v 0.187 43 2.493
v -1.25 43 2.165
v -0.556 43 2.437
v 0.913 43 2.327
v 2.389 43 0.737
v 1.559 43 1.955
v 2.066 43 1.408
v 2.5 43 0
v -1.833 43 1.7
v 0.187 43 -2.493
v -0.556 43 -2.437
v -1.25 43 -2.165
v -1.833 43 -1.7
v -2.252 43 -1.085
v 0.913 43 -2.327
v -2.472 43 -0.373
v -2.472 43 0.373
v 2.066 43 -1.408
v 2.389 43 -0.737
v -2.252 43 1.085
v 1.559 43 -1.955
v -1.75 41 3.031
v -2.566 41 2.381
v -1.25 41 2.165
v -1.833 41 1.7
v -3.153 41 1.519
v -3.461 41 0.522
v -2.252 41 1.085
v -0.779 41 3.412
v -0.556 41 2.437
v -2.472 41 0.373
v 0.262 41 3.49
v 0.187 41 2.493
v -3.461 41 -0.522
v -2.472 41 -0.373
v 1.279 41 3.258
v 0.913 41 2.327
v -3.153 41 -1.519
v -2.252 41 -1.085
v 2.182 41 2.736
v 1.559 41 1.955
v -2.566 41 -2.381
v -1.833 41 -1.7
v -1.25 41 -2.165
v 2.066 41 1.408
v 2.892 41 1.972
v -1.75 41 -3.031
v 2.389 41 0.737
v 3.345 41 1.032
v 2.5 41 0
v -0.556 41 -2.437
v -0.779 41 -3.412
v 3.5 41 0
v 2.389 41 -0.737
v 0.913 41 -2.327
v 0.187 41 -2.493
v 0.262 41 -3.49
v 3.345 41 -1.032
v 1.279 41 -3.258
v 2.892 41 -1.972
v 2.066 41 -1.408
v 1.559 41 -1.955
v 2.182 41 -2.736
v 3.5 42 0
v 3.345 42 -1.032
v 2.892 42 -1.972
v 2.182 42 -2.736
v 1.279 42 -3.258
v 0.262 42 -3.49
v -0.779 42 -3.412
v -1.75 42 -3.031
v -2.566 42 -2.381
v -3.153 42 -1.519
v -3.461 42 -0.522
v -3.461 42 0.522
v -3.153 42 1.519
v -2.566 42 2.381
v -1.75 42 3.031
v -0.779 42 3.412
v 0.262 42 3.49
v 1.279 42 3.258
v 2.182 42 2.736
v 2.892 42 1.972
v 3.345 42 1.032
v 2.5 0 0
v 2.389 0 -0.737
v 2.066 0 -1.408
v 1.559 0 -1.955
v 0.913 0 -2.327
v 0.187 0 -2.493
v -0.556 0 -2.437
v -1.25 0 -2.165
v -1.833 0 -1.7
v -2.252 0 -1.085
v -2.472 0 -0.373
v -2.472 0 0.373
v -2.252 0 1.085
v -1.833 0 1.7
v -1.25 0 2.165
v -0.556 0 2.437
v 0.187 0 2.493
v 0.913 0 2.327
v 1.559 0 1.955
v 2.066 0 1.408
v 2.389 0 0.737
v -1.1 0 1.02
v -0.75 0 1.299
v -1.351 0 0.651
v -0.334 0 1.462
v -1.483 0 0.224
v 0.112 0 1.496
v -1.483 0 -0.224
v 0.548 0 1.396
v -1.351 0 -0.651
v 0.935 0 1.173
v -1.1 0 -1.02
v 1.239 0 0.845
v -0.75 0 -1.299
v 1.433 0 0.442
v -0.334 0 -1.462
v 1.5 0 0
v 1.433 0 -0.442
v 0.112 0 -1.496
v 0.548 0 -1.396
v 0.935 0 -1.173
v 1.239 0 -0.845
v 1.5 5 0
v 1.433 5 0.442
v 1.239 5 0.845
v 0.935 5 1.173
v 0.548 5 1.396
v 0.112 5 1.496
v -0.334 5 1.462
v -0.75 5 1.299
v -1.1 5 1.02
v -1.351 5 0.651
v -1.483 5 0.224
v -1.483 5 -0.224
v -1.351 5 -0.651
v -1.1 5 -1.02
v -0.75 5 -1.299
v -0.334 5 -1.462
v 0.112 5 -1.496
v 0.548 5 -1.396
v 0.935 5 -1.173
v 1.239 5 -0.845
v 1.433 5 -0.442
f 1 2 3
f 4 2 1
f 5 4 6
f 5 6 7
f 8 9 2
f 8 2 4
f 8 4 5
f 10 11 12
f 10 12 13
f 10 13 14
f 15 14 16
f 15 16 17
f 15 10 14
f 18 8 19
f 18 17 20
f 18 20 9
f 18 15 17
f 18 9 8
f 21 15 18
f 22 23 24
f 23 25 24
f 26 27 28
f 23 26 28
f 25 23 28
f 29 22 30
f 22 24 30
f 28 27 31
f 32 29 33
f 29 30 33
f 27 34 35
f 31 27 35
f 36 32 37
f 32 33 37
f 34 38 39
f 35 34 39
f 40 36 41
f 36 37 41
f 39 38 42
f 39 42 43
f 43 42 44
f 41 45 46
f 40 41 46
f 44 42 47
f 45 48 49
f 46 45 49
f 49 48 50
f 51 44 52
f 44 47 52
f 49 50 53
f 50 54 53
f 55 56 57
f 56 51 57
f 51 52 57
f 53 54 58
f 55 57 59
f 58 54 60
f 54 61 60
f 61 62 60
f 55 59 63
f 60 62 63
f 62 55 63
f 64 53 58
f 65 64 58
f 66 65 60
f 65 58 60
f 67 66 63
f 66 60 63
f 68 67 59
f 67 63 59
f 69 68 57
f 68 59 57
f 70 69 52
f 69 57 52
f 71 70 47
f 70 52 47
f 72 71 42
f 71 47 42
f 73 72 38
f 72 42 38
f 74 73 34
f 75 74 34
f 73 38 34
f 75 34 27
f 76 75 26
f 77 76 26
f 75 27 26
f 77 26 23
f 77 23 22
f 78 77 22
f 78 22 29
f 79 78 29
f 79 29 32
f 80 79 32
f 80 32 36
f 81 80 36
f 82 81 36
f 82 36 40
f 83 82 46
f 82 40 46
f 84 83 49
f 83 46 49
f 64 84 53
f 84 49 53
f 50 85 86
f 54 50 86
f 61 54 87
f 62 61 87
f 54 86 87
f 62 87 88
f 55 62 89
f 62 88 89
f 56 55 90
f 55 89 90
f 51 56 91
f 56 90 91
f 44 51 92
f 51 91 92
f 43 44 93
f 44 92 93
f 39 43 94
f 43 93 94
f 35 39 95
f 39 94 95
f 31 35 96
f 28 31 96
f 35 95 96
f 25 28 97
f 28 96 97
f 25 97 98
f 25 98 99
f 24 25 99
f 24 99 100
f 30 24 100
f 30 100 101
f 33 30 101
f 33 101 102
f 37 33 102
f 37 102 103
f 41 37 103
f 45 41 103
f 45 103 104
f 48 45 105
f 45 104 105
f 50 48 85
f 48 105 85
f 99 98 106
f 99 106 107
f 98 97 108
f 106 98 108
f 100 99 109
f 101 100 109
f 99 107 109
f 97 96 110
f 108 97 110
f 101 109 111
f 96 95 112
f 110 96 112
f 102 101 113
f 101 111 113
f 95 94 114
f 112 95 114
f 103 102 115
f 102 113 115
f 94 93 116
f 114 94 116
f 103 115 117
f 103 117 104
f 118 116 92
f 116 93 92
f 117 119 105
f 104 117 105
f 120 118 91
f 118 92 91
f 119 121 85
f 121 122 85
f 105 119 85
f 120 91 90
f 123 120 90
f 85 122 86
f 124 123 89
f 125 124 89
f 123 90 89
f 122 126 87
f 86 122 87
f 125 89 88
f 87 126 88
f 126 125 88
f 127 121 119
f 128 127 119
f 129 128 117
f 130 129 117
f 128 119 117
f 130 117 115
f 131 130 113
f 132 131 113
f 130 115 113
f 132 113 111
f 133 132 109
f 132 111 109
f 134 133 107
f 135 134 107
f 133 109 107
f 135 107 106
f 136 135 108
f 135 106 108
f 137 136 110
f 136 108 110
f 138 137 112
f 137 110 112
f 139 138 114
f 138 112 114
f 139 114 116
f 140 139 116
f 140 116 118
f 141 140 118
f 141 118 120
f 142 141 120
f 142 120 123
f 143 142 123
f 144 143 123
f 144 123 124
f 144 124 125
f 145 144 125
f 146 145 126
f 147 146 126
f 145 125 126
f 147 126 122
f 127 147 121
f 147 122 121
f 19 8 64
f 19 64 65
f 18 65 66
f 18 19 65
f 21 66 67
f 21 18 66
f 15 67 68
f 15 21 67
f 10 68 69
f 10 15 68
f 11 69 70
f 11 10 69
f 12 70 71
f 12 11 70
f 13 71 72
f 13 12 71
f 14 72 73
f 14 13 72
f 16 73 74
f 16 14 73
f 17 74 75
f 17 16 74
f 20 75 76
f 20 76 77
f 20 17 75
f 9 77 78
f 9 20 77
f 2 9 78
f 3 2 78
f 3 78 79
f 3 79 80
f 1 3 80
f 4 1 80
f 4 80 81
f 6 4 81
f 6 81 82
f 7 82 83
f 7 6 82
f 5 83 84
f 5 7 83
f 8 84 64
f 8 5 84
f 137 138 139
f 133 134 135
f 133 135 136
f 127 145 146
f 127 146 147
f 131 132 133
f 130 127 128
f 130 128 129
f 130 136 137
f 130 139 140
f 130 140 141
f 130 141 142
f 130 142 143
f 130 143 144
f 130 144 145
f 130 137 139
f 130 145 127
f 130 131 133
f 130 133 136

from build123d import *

# Parameters (mm, degrees)
SKETCH1_R           = 2.5
BOSS_EXTRUDE1_DEPTH = 41
SKETCH2_R           = 3.5
BOSS_EXTRUDE2_DEPTH = 2
CHAMFER1_SIZE       = 1
SKETCH3_R           = 1.5
CUT_EXTRUDE1_DEPTH  = 5


with BuildPart() as part:
    # Sketch1 → Boss-Extrude1 (new body)
    with BuildSketch(Plane(origin=(0, 0, 0), x_dir=(1, 0, 0), z_dir=(0, 1, 0))):
        Circle(SKETCH1_R)
    extrude(amount=BOSS_EXTRUDE1_DEPTH)

    # Sketch2 → Boss-Extrude2 (add)
    with BuildSketch(Plane(origin=(0, 41, 0), x_dir=(1, 0, 0), z_dir=(0, 1, 0))):
        Circle(SKETCH2_R)
    extrude(amount=BOSS_EXTRUDE2_DEPTH)

    # Chamfer1
    chamfer1_edges = [part.edges().sort_by_distance(p)[0] for p in [
        (-3.5, 43, 0),
    ]]
    chamfer(chamfer1_edges, length=CHAMFER1_SIZE)

    # Sketch3 → Cut-Extrude1 (cut)
    with BuildSketch(Plane.XZ):
        Circle(SKETCH3_R)
    extrude(amount=-CUT_EXTRUDE1_DEPTH, mode=Mode.SUBTRACT)


solid = part.part
